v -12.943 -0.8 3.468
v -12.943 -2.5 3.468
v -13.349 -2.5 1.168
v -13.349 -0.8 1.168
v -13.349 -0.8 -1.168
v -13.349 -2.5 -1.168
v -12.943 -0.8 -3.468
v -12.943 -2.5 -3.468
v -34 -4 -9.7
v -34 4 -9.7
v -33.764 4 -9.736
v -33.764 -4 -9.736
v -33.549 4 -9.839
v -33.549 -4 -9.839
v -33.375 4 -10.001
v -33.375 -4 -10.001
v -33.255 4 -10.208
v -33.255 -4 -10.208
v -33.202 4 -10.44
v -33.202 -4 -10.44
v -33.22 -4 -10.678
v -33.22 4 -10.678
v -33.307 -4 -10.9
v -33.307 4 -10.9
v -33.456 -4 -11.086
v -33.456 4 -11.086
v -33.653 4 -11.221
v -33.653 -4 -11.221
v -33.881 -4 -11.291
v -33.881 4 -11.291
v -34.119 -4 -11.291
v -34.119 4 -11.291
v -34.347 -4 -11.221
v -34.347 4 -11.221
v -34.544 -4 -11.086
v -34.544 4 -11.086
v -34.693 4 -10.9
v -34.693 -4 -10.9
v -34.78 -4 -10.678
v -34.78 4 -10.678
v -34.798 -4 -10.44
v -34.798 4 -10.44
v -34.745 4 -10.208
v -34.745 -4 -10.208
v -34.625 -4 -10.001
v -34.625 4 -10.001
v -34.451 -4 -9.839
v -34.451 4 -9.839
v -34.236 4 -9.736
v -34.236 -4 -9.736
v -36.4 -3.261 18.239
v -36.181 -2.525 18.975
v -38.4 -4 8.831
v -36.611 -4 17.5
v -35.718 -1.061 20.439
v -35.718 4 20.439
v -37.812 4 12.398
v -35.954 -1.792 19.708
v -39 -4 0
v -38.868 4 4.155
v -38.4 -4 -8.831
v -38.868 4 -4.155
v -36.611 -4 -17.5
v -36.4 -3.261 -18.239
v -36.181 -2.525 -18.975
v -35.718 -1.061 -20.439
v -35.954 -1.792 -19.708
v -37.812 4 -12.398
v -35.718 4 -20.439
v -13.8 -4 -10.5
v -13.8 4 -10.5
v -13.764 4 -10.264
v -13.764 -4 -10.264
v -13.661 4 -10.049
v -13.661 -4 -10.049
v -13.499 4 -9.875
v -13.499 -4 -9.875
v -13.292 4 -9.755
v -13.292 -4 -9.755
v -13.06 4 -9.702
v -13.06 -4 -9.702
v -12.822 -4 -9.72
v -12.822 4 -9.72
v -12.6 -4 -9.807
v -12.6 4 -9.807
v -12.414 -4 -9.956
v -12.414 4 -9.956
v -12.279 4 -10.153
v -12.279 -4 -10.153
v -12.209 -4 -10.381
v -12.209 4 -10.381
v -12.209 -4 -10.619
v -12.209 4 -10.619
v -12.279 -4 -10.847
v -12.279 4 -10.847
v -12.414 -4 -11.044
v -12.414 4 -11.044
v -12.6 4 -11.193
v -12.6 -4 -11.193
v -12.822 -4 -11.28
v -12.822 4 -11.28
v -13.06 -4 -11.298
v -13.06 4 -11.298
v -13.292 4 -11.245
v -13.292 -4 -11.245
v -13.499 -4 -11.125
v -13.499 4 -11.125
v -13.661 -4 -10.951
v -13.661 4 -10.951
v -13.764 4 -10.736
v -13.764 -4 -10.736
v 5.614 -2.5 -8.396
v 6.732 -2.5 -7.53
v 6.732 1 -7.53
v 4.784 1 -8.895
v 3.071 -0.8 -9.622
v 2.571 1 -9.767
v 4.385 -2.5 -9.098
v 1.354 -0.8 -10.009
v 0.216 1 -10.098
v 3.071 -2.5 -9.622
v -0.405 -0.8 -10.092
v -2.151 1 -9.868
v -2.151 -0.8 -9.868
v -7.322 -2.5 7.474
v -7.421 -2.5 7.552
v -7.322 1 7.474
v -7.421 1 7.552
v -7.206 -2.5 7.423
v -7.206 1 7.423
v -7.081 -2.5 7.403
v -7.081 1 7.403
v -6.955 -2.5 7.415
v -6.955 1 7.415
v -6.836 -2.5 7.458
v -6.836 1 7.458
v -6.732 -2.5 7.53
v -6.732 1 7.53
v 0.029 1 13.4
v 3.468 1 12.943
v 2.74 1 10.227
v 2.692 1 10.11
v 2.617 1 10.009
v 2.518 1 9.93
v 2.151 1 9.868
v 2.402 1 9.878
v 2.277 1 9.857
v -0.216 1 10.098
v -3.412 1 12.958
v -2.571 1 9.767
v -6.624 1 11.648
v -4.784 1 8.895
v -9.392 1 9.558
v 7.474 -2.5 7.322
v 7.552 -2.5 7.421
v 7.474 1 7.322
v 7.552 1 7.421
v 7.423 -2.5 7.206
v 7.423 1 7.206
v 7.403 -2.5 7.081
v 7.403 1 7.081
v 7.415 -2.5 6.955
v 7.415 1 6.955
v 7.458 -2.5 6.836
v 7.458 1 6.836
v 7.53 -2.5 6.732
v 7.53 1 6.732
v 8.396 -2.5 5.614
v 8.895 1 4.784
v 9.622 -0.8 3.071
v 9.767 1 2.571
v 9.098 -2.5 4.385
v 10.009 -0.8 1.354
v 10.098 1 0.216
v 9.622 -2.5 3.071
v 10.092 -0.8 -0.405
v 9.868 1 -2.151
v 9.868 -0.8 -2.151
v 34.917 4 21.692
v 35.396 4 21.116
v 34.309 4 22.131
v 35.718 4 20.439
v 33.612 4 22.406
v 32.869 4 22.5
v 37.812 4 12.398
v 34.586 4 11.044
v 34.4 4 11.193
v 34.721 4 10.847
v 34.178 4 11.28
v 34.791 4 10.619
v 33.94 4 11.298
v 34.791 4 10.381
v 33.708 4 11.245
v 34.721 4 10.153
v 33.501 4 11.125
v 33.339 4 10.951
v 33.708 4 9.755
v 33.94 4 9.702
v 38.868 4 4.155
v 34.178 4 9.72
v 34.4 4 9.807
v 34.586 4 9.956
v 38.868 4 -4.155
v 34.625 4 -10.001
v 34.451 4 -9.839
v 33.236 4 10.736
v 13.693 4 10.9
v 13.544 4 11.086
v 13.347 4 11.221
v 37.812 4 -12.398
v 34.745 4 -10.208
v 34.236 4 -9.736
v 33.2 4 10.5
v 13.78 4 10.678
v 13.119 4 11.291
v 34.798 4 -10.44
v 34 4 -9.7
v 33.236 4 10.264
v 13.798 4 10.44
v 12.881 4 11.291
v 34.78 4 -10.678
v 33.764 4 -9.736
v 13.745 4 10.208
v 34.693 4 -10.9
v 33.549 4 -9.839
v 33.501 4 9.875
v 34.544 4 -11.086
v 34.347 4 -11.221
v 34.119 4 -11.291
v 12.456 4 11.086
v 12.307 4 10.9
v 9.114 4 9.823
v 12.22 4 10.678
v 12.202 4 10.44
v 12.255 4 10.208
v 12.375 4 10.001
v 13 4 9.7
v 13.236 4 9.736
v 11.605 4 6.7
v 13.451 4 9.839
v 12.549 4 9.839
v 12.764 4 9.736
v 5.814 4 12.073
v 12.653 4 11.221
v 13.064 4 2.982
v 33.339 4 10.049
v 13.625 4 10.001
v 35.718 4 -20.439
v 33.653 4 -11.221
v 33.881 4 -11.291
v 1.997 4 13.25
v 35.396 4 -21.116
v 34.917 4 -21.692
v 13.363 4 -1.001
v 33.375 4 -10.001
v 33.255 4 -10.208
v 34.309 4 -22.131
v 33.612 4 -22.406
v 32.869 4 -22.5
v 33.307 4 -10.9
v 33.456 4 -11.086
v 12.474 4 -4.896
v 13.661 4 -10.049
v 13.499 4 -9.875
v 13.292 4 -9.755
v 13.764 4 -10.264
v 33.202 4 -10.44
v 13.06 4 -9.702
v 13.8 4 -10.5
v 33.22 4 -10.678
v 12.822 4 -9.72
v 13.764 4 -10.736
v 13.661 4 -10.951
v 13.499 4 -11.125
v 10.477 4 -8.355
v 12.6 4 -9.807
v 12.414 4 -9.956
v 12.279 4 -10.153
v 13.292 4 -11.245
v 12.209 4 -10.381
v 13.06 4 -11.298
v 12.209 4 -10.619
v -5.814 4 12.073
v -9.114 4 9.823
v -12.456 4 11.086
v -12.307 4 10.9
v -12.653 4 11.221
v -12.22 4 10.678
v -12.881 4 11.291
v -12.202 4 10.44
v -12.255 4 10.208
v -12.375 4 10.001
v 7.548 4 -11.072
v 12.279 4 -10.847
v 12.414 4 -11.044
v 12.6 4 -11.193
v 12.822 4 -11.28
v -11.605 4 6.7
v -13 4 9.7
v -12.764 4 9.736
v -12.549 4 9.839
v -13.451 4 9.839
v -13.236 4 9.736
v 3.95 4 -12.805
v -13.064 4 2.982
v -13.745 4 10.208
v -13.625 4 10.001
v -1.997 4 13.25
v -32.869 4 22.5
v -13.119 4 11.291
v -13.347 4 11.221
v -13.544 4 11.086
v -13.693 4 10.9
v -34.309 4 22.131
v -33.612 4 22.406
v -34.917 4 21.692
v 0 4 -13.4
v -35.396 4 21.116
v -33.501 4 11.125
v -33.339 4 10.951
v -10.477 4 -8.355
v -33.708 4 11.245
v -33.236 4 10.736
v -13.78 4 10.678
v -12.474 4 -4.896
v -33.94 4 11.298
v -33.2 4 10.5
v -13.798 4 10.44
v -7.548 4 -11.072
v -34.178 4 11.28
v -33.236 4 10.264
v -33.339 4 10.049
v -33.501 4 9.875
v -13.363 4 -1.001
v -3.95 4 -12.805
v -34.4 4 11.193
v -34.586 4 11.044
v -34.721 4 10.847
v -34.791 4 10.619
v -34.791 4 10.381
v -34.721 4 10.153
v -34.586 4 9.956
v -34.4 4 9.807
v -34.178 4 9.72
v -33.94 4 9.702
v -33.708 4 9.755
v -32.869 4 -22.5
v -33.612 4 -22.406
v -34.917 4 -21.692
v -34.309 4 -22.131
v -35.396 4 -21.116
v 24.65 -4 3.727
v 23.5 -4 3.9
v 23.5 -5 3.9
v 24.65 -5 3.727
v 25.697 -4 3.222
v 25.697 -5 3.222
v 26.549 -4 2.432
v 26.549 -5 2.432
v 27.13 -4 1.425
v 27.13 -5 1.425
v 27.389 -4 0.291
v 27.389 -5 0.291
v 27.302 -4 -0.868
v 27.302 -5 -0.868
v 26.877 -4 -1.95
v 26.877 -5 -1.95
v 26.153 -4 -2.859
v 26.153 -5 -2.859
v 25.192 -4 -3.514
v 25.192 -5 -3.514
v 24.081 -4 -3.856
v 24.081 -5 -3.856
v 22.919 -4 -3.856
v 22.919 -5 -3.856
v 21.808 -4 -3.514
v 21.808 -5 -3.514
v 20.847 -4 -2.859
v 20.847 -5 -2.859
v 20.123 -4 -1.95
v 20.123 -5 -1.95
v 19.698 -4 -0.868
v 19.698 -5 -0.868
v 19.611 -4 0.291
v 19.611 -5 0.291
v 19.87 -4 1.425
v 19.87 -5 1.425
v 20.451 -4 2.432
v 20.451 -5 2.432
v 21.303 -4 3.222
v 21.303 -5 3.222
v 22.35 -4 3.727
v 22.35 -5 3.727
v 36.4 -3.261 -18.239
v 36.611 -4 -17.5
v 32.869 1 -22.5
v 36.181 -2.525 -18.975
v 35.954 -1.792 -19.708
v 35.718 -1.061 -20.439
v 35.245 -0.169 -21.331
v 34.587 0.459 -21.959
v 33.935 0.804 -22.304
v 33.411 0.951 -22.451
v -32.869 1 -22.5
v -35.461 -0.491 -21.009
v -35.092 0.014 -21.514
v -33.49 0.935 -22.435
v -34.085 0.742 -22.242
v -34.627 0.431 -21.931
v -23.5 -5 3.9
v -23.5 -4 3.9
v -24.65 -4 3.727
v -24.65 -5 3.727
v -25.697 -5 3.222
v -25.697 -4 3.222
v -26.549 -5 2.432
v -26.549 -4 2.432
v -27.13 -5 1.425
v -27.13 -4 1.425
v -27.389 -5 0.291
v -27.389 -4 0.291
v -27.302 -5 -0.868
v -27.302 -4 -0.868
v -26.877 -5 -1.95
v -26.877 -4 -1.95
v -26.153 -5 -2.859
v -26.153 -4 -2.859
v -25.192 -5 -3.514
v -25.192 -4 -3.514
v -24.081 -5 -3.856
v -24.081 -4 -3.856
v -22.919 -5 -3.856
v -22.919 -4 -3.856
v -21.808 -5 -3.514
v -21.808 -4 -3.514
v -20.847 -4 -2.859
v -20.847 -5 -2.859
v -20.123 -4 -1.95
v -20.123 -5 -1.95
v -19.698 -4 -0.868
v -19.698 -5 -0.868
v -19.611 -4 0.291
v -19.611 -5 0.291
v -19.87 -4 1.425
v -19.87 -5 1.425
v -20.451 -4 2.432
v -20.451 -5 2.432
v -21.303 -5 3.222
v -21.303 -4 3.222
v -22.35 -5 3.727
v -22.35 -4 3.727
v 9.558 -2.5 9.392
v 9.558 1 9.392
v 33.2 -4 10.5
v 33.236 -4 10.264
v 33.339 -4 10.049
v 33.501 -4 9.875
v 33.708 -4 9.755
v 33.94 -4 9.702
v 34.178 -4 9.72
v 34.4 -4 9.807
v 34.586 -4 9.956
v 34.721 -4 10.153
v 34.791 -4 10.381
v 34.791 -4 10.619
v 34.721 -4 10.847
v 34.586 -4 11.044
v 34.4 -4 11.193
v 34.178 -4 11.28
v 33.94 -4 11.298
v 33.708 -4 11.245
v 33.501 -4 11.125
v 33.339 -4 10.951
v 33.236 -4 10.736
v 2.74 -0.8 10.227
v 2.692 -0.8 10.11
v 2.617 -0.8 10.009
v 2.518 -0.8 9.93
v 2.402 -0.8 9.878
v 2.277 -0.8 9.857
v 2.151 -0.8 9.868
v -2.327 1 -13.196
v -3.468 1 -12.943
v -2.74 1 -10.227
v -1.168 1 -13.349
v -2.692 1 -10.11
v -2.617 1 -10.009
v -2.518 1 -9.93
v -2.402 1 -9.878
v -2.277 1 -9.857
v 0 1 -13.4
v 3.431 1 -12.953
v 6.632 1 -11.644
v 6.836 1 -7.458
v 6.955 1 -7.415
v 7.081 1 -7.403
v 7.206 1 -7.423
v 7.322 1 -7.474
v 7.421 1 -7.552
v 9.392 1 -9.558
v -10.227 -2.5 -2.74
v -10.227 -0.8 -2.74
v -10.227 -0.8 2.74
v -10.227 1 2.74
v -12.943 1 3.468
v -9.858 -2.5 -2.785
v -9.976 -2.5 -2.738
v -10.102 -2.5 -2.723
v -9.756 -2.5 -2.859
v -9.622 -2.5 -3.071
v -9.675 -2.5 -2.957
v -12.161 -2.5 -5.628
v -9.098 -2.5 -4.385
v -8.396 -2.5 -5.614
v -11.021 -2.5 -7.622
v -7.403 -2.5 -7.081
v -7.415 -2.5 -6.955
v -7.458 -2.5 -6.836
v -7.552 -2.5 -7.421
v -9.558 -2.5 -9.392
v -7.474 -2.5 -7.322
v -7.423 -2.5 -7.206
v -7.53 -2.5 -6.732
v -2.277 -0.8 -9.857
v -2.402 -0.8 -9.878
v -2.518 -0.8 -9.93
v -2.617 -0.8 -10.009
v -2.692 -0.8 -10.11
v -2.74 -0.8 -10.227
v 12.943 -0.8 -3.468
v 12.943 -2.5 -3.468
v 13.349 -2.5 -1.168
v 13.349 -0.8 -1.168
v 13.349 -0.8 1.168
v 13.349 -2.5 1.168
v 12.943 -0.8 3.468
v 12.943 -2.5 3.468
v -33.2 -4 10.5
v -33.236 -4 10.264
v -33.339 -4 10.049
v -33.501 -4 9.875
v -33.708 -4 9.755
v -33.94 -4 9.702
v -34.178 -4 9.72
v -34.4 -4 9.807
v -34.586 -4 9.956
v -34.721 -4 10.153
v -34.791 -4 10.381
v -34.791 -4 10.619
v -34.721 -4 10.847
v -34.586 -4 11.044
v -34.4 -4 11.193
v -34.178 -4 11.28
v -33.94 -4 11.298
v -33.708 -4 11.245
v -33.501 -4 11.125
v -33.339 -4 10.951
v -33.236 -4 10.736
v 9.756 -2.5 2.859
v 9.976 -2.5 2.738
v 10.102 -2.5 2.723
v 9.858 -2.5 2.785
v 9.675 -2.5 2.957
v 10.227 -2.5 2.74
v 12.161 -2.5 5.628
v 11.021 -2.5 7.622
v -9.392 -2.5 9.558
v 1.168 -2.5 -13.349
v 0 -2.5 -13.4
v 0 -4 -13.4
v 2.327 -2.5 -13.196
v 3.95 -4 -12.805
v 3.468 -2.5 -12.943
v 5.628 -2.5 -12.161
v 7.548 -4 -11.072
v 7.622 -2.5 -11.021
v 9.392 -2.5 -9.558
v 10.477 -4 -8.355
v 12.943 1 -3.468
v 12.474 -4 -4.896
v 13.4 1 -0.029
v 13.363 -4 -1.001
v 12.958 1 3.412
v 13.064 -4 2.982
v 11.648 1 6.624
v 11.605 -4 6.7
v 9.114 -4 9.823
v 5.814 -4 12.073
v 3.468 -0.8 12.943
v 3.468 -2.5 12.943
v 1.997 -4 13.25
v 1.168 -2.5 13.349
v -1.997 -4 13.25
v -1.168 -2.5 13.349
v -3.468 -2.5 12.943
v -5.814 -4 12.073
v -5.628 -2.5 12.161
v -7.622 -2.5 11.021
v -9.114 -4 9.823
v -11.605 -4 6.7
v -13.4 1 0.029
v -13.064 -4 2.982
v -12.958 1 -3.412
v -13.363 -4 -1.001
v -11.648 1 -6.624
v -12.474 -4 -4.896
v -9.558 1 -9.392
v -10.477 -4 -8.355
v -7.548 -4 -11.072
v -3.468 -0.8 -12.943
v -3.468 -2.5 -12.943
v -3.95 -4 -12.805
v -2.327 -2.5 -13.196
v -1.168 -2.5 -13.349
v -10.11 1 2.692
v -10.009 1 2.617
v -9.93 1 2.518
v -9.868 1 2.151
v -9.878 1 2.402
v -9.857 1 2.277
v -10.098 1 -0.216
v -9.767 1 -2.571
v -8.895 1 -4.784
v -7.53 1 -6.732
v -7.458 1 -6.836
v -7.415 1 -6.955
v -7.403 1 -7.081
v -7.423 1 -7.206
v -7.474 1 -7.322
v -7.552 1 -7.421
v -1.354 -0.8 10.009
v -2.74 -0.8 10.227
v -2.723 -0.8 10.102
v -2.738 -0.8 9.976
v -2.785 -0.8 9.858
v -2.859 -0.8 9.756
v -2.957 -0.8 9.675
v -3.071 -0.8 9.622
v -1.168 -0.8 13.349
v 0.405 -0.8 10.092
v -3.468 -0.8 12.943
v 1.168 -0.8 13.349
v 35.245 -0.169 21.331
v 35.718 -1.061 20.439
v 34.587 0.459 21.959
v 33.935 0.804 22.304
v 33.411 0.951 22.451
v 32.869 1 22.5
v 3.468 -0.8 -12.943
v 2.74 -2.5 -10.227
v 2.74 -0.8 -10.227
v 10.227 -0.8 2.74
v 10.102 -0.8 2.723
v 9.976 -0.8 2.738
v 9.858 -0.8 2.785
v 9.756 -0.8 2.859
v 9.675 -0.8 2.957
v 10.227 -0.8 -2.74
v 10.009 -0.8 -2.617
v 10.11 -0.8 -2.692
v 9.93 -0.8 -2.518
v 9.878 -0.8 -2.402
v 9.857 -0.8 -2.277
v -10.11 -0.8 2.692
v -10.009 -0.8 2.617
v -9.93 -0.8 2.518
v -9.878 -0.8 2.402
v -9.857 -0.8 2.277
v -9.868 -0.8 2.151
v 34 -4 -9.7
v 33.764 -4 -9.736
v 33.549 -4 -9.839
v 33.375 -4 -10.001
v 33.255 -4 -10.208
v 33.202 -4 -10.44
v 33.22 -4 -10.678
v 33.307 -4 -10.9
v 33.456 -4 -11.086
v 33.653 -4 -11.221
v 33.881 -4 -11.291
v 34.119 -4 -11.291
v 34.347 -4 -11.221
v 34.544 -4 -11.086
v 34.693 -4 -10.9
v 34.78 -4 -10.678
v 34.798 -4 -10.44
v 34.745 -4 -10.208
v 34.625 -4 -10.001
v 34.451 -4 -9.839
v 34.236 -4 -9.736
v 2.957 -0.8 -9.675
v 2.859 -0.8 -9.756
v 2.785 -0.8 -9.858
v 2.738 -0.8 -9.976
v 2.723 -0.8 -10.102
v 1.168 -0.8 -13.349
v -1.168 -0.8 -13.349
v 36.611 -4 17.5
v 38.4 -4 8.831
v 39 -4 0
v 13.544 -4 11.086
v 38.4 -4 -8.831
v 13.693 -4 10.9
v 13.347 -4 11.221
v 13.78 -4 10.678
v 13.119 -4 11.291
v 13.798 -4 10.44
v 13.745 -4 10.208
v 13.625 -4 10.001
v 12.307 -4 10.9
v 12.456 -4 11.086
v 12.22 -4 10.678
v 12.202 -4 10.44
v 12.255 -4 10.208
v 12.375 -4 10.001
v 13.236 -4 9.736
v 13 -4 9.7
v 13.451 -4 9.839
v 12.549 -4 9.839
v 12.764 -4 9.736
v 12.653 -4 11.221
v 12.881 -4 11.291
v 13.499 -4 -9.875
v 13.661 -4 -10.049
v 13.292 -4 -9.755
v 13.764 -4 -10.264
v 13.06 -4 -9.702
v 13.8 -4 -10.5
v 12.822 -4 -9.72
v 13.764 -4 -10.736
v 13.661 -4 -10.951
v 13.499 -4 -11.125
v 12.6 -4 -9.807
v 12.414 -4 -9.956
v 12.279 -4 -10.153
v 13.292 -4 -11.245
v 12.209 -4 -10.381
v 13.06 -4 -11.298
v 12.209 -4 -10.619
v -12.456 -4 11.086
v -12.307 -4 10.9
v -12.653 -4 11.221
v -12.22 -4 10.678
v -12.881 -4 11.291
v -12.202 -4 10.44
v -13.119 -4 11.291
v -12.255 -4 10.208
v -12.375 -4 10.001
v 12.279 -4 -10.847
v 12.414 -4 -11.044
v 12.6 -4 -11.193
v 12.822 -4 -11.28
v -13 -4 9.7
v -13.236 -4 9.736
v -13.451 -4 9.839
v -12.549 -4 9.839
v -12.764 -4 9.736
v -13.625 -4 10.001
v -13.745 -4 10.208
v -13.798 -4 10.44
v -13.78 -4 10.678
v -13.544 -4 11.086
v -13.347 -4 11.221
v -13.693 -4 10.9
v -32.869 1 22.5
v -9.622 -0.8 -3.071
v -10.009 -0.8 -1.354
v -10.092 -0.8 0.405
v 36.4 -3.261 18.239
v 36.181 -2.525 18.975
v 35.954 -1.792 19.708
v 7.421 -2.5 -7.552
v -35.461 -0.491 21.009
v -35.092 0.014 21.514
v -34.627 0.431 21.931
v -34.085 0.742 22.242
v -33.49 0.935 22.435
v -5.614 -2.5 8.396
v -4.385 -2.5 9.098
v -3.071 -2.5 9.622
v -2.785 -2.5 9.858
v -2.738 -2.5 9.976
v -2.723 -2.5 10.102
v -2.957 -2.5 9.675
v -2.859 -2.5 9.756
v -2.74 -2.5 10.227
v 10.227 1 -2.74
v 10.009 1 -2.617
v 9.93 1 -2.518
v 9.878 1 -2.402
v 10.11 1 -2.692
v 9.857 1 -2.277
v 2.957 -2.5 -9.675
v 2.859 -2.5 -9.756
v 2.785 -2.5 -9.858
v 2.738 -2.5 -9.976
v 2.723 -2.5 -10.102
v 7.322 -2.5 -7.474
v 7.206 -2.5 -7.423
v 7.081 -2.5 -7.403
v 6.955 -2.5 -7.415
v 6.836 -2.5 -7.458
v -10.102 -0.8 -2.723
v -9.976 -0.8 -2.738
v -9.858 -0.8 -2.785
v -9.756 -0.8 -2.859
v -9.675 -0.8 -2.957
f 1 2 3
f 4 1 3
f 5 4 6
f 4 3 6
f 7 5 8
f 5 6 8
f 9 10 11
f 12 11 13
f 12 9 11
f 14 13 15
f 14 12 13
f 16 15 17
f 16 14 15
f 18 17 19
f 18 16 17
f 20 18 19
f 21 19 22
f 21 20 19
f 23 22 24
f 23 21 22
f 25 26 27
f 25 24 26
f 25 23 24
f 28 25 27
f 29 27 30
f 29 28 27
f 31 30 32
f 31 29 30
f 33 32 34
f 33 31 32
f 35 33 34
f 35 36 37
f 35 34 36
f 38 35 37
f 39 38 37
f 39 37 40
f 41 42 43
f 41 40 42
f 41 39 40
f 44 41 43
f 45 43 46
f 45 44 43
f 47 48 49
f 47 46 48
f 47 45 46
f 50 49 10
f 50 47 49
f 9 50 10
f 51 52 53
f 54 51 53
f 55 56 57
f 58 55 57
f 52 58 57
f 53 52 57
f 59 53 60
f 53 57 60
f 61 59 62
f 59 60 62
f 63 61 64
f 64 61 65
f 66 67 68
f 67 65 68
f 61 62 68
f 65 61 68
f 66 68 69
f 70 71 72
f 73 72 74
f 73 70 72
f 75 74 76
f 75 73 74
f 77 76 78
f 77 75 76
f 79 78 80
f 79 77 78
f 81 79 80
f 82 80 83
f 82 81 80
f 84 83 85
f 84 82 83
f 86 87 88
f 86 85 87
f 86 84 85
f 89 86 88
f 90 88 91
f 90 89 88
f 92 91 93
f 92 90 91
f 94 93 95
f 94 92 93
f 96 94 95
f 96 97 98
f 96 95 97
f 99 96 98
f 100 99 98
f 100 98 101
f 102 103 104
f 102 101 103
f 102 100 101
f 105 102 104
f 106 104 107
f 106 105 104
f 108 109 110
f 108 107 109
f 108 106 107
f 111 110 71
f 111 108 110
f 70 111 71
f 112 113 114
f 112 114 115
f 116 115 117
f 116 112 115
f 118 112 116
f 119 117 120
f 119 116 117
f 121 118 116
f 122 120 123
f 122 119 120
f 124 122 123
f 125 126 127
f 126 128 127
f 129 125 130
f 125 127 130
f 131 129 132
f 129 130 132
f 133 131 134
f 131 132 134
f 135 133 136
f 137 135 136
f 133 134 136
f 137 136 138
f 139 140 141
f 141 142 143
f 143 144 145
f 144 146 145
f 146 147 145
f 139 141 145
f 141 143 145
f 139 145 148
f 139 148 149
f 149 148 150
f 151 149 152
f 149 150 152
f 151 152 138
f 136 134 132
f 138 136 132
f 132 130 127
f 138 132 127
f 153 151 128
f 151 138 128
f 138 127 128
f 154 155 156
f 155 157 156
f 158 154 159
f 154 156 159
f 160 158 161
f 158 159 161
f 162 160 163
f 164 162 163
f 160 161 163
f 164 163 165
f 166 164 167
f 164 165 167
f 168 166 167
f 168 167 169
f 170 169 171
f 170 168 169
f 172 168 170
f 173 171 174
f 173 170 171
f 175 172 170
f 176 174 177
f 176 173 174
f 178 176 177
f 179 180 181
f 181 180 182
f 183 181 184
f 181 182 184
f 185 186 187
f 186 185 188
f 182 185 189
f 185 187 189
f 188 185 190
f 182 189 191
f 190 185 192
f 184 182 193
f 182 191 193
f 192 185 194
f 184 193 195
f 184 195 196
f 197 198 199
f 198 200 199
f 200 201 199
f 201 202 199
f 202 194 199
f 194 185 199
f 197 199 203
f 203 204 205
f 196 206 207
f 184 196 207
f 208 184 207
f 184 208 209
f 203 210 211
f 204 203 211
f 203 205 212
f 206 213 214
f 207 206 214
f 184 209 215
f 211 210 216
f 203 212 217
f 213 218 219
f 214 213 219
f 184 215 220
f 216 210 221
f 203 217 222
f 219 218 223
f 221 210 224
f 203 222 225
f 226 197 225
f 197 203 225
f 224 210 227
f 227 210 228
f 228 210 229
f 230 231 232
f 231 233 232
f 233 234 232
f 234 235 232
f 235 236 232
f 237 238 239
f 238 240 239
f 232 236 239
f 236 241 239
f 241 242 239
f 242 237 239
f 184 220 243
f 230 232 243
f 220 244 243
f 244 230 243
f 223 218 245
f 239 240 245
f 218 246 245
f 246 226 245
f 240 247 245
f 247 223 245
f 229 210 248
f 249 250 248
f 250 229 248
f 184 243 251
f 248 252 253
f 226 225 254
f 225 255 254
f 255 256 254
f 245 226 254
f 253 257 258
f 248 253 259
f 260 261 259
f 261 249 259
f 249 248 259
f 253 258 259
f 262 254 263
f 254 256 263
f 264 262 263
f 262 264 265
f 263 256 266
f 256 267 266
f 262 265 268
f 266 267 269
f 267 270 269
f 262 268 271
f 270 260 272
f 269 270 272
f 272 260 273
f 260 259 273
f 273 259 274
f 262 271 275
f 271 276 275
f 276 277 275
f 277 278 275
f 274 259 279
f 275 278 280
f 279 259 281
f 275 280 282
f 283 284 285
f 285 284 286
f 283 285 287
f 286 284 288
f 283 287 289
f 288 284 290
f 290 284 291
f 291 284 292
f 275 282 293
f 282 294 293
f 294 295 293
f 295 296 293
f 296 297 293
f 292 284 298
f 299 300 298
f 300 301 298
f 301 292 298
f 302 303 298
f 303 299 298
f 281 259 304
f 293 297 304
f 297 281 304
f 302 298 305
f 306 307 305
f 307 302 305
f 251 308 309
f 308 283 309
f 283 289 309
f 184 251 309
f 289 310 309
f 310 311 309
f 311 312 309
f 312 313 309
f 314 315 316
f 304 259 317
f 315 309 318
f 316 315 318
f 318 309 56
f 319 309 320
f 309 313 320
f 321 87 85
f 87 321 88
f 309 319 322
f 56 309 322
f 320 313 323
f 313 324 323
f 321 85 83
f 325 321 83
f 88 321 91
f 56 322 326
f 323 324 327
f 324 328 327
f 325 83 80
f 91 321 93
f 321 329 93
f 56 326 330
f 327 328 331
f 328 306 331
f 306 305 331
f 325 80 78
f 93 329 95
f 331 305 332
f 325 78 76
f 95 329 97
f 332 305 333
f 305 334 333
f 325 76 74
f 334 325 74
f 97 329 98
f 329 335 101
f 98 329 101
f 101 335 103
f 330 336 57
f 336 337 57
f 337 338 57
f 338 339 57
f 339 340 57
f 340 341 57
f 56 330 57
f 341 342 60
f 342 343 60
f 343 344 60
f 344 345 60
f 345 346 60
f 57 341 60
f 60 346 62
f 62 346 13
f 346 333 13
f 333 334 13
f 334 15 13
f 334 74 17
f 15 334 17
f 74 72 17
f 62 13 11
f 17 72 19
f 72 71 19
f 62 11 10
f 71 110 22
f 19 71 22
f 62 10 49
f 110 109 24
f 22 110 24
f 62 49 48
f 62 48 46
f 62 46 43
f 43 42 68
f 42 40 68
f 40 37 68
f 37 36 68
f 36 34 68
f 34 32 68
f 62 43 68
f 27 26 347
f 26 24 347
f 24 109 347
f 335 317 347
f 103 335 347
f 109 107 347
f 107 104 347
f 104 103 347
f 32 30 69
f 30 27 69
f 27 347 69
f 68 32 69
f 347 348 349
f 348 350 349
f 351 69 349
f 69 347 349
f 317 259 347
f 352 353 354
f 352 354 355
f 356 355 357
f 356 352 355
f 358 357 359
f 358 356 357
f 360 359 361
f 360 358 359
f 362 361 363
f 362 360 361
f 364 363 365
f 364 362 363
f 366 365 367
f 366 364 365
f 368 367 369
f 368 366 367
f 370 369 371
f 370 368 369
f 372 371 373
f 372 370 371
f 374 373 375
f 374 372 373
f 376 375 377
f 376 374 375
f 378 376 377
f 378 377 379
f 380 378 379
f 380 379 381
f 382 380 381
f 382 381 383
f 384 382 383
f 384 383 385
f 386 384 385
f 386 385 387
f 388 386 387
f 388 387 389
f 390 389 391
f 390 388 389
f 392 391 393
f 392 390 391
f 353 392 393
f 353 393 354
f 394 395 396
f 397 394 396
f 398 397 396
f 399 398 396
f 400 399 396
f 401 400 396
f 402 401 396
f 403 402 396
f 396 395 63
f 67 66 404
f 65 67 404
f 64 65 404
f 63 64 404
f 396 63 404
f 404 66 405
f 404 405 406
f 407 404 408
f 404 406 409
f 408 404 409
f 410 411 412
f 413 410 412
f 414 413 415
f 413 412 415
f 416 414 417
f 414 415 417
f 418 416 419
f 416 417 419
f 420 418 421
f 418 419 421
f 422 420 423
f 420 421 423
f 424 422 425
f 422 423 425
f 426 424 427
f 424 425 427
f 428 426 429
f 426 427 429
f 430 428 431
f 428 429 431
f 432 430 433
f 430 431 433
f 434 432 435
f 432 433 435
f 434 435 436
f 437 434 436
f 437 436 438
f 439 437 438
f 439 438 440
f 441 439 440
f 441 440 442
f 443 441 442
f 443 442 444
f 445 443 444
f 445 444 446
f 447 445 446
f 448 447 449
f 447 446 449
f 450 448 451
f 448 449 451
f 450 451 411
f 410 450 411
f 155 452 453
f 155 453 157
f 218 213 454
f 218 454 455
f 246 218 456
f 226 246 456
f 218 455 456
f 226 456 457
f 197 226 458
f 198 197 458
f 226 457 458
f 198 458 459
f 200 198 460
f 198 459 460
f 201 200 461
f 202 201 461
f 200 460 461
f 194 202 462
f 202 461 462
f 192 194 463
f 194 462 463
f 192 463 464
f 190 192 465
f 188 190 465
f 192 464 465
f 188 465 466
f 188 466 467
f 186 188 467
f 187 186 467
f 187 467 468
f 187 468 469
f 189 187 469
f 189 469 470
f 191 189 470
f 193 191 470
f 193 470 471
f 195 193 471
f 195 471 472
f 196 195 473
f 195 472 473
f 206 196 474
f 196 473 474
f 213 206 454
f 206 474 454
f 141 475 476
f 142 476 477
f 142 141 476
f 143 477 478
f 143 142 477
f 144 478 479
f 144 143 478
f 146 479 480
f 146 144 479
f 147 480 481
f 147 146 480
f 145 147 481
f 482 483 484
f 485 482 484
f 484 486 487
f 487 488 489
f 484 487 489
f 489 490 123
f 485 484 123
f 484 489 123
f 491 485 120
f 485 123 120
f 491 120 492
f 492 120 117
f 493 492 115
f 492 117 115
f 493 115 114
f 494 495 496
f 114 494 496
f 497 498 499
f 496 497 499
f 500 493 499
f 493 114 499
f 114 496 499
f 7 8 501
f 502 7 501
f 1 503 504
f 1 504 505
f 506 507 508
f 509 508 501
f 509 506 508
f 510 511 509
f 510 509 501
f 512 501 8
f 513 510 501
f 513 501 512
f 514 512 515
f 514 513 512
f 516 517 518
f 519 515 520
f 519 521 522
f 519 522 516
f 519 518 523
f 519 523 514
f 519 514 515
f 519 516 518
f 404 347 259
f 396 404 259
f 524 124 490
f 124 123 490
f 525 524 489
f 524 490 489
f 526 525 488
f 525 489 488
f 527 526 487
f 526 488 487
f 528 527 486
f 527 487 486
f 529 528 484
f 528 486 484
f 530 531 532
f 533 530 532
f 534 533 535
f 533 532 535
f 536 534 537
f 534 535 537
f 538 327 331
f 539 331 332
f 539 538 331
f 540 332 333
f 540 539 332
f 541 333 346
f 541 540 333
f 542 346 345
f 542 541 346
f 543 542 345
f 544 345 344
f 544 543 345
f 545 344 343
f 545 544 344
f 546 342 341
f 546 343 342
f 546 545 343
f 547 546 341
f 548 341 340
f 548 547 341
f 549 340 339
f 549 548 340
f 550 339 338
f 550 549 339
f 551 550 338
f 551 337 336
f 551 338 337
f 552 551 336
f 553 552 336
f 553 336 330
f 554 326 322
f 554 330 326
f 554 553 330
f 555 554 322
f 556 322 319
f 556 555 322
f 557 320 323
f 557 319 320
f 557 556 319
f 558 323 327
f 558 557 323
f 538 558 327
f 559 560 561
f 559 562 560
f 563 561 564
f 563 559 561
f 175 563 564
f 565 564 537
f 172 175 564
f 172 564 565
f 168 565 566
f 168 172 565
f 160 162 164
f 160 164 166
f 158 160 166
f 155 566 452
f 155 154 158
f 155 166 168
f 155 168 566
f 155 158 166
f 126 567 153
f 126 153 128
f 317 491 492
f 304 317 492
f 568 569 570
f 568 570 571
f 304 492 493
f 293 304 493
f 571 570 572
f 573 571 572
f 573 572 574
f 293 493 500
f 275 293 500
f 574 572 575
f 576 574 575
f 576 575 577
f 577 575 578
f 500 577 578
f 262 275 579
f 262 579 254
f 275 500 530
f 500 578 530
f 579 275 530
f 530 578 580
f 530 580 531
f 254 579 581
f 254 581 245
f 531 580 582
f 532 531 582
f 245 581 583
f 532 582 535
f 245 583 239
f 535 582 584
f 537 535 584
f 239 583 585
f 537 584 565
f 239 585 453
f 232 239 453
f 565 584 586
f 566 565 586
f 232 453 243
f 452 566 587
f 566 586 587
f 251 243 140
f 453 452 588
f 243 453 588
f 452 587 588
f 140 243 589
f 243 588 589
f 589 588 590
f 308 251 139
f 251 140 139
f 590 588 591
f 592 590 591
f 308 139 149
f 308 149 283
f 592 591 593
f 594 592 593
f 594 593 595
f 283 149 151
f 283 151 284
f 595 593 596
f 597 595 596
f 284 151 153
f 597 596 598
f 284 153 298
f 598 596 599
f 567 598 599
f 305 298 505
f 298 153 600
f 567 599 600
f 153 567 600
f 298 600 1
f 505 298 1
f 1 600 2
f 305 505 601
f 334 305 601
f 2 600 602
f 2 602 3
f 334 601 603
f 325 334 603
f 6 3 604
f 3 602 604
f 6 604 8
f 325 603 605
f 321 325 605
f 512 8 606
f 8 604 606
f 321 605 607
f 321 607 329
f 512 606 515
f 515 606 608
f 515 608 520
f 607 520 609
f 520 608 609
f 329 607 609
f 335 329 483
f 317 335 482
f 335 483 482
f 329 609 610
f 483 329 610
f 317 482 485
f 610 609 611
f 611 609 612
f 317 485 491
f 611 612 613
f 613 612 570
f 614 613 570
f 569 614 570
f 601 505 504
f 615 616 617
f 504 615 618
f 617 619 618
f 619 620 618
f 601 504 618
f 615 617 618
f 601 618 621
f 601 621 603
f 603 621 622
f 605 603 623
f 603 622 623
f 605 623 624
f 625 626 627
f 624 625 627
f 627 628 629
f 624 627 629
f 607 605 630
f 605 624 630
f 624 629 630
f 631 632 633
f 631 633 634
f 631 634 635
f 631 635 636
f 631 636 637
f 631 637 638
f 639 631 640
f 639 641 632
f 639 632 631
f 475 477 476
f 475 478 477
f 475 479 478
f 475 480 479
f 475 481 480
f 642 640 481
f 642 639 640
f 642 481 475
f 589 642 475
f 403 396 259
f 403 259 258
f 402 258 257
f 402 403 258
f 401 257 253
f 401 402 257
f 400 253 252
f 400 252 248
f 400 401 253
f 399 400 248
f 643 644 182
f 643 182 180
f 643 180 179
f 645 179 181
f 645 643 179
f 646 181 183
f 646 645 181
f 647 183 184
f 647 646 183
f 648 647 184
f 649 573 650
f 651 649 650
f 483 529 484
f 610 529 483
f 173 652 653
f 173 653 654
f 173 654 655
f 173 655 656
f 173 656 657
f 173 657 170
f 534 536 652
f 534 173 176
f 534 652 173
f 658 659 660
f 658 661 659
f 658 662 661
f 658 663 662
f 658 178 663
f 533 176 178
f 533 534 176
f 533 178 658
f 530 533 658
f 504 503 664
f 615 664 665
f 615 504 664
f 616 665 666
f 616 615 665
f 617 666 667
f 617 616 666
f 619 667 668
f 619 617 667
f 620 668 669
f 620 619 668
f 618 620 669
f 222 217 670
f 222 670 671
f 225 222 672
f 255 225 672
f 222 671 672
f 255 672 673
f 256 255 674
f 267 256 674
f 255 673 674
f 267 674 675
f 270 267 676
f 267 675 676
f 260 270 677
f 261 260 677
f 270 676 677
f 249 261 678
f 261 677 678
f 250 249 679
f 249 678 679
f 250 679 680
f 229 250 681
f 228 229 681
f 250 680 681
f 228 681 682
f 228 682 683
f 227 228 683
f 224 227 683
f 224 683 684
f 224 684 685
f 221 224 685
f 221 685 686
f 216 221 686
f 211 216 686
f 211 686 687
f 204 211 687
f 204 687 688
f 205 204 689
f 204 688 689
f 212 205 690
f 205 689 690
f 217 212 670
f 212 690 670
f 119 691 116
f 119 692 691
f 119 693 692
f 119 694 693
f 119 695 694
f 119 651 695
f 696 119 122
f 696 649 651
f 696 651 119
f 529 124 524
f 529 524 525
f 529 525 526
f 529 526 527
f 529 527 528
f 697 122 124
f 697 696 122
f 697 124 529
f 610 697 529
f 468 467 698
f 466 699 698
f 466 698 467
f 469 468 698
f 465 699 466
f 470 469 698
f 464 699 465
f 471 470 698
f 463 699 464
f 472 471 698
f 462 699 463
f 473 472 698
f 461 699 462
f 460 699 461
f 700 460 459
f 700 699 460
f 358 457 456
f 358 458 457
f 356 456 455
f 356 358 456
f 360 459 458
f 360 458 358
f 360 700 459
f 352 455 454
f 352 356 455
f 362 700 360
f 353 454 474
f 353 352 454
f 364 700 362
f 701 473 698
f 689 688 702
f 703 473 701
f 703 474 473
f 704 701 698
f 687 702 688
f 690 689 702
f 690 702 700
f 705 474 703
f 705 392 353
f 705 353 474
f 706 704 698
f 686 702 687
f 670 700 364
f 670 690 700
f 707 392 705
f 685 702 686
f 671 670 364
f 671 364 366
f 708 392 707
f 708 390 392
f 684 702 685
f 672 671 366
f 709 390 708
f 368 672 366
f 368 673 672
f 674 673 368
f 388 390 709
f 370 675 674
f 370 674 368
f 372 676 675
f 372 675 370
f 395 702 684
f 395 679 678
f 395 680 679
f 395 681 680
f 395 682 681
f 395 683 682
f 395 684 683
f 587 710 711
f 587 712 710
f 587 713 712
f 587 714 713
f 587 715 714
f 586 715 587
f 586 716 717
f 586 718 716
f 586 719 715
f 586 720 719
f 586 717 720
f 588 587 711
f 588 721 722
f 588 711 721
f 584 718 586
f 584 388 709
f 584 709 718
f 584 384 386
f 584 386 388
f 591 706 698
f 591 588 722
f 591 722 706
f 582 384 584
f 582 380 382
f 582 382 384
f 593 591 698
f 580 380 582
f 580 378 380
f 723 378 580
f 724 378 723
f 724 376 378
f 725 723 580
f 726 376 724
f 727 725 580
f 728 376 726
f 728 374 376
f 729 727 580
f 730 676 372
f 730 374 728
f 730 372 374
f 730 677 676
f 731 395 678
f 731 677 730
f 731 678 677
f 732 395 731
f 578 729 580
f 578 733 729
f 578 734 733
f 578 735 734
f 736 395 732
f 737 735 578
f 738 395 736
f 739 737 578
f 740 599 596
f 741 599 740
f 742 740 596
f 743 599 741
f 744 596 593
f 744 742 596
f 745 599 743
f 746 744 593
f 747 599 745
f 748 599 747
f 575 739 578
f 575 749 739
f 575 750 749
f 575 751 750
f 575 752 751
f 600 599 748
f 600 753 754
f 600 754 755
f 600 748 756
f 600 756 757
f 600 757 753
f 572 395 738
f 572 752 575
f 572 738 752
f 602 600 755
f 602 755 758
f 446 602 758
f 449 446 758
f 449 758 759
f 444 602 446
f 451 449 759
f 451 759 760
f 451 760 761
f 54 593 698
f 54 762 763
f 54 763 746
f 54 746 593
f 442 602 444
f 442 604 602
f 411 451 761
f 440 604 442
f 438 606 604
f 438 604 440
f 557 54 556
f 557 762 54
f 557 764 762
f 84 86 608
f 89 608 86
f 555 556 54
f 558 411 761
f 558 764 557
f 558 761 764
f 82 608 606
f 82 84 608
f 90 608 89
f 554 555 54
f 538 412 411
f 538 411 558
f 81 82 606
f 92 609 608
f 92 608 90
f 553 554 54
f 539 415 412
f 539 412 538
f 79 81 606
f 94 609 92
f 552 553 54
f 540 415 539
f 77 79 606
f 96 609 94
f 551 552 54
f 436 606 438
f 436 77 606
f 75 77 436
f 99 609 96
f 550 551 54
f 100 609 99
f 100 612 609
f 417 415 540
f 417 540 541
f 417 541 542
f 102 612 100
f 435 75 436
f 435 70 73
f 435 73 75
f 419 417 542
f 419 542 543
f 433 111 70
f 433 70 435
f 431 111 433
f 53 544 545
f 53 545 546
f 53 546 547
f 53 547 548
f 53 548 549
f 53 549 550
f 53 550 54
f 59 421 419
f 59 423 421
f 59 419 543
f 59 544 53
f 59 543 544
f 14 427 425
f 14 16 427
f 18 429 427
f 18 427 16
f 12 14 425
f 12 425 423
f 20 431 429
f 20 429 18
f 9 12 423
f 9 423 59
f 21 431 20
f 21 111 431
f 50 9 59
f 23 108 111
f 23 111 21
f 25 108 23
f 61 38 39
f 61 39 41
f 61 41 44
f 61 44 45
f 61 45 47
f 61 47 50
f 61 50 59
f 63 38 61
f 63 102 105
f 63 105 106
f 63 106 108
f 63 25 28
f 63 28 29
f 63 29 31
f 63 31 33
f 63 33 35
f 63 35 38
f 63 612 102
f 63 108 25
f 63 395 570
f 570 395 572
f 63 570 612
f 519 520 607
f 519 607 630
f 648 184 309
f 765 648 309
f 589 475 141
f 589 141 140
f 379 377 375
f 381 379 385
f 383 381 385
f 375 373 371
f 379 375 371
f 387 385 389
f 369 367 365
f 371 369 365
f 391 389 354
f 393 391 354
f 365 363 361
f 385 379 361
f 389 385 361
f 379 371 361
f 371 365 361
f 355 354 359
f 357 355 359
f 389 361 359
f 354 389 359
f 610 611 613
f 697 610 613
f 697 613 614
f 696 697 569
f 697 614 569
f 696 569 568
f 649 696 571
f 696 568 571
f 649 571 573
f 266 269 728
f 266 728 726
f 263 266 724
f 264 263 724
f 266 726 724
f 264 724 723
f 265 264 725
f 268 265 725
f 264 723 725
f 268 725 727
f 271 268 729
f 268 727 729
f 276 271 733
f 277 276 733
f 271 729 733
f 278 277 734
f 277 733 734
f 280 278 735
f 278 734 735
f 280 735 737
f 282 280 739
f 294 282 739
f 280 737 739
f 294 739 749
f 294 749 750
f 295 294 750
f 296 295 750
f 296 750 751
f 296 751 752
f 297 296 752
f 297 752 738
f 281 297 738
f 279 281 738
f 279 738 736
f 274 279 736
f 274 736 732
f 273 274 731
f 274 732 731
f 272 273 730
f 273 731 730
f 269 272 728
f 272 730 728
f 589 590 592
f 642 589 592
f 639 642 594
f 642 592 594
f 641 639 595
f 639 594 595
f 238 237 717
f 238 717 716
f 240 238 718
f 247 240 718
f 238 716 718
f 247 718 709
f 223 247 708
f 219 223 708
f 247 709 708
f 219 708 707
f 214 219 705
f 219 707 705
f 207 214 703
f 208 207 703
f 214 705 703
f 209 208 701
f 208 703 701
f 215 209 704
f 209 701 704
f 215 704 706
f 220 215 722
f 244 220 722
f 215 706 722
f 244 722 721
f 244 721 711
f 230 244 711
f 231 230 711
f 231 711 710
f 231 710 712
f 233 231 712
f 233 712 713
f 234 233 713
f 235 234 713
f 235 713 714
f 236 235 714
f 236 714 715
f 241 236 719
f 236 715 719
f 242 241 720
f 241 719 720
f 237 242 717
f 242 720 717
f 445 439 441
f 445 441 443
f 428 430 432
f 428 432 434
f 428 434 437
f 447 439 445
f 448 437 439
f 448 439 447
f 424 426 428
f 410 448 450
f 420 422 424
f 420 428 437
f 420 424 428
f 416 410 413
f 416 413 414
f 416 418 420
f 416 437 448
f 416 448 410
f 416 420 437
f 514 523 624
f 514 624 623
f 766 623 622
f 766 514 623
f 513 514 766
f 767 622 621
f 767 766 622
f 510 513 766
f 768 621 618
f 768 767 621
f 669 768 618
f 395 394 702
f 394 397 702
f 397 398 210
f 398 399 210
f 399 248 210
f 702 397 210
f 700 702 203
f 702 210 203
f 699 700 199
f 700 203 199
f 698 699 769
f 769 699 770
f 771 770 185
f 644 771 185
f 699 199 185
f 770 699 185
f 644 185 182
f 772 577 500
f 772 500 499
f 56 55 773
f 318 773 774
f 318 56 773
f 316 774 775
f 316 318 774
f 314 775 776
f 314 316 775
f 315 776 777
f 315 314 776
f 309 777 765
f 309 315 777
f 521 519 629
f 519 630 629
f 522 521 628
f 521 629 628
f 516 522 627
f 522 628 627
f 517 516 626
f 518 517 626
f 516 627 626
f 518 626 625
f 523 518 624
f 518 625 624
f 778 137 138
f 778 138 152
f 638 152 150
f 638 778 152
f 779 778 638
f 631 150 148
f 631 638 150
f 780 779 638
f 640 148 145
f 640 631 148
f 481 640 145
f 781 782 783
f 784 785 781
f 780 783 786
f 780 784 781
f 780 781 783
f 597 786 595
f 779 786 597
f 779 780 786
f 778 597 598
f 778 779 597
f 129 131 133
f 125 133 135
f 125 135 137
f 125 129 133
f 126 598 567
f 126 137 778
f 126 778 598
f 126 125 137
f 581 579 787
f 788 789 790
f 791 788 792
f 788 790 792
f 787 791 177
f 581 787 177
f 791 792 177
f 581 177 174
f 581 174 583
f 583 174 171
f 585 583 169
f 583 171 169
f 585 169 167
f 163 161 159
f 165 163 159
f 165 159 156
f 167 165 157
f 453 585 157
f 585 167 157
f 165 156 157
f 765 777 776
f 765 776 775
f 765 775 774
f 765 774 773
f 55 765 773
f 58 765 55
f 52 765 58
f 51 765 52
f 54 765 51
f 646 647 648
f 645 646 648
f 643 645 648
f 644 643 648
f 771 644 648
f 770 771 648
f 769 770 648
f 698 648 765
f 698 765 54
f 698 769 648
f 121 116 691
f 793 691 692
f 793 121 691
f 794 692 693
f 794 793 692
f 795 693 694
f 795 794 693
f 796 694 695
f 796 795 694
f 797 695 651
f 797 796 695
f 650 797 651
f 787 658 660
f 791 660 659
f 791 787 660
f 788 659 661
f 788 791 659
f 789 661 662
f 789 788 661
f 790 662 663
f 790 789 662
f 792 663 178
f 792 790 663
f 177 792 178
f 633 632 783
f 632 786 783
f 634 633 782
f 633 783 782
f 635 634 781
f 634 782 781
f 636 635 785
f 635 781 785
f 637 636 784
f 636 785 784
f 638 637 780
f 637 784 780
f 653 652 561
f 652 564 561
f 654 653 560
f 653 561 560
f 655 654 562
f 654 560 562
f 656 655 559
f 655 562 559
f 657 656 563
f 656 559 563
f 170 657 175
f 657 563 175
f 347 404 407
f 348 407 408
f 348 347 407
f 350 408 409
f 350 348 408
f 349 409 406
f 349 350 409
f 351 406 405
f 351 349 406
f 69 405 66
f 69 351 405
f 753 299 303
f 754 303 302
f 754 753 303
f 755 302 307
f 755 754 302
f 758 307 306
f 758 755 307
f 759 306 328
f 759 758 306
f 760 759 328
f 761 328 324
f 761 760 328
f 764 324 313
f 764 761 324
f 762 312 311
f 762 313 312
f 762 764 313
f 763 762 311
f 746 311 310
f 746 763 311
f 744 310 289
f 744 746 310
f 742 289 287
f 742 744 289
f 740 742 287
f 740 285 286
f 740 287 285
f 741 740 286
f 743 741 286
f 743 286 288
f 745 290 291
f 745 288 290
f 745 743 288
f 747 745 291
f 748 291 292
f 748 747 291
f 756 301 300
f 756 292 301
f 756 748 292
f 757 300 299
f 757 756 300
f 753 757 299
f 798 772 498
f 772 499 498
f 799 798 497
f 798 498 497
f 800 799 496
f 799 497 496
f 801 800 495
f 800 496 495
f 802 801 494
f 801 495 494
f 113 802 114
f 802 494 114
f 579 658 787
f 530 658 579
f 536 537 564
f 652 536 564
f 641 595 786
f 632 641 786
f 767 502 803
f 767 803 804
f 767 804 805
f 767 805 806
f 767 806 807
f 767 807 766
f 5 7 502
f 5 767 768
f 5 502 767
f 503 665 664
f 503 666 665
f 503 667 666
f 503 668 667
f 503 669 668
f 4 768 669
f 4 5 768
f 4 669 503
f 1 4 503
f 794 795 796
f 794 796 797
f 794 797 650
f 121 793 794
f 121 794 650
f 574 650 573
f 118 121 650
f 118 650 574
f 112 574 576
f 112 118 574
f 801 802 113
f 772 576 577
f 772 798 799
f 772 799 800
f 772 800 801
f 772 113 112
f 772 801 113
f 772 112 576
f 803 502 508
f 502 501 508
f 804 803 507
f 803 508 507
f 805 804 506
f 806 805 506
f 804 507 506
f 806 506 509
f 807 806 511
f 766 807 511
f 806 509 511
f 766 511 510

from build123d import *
from build123d.topology import SkipClean

# Parameters (mm, degrees)
EXTRUDE_1_DEPTH                  = 4
SKETCH_9_R                       = 13.4
CUT_EXTRUDE_1_DEPTH              = 46.730186967
FILLET_4_R                       = 3
CHAMFER_3_SIZE                   = 5
SKETCH_10_R                      = 3.9
EXTRUDE_8_DEPTH                  = 1
PATTERN_CIRCULAR_4_COUNT         = 4
EXTRUDE_START                    = -3.5
EXTRUDE_9_DEPTH                  = 3.5
CUT_EXTRUDE_2_DEPTH              = 1.7
FILLET_5_R                       = 0.5
PATTERN_CIRCULAR_5_COUNT         = 4
FILLET_5_OF_PATTERN_CIRCULAR_5_R = 0.5


with BuildPart() as part:
    # ｽｹｯﾁ2 → ﾎﾞｽ - 押し出し1 (new, symmetric)
    with BuildSketch(Plane(origin=(0, 0, 0), x_dir=(1, 0, 0), z_dir=(0, 1, 0))):
        with BuildLine():
            Line((-35, 22.5), (35, 22.5))
            ThreePointArc((35, 22.5), (39, 0), (35, -22.5))
            Line((35, -22.5), (-35, -22.5))
            ThreePointArc((-35, -22.5), (-39, 0), (-35, 22.5))
        make_face()
    extrude(amount=EXTRUDE_1_DEPTH, both=True)

    # ｽｹｯﾁ9 → ｶｯﾄ - 押し出し1 (cut, through all)
    with BuildSketch(Plane.XZ.offset(4)):
        with Locations(Location((0, 0, 0), (0, 0, 270))):
            Circle(SKETCH_9_R)
    extrude(amount=-CUT_EXTRUDE_1_DEPTH, mode=Mode.SUBTRACT)

    # ﾌｨﾚｯﾄ4
    fillet_4_edges = [part.edges().sort_by_distance(p)[0] for p in [
        (-35, 0, -22.5),
        (35, 0, -22.5),
        (35, 0, 22.5),
        (-35, 0, 22.5),
    ]]
    fillet(fillet_4_edges, radius=FILLET_4_R)

    # 面取り3
    # the kernel refuses this chamfer: 5 mm, written as the material it takes off along each edge
    with BuildSketch(Plane(origin=(-45.727009416, -4, -22.5), x_dir=(0, -0.027495876610586317, 0.9996219169112968), z_dir=(1, 0, 0))) as chamfer_3_piece_1:
        Polygon((CHAMFER_3_SIZE * 0.999621916911, -CHAMFER_3_SIZE * 0.0274958766106), (-CHAMFER_3_SIZE * 0.0274958766106, -CHAMFER_3_SIZE * 0.999621916911), (0, 0), align=None)
    extrude(amount=91.454018832, mode=Mode.SUBTRACT)
    with BuildSketch(Plane(origin=(45.727009416, -4, 22.5), x_dir=(0, 0.9996219169112968, 0.027495876610586317), z_dir=(-1, 0, 0))) as chamfer_3_piece_2:
        Polygon((CHAMFER_3_SIZE * 0.999621916911, CHAMFER_3_SIZE * 0.0274958766106), (-CHAMFER_3_SIZE * 0.0274958766106, CHAMFER_3_SIZE * 0.999621916911), (0, 0), align=None)
    extrude(amount=91.454018832, mode=Mode.SUBTRACT)

    # ｽｹｯﾁ10 → ﾎﾞｽ - 押し出し8 (add)
    with BuildSketch(Plane.XZ.offset(4)):
        with Locations(Location((-23.5, 0, 0), (0, 0, 90))):
            Circle(SKETCH_10_R)
    extrude_8 = extrude(amount=EXTRUDE_8_DEPTH)

    # ｽｹｯﾁ12 → M2 ねじ穴1 (revolve, cut)
    with BuildSketch(Plane(origin=(-13, -4, 10.5), x_dir=(0, 0, -1), z_dir=(1, 0, 0))):
        Polygon((0, 0), (0, 10.480688495), (0.8, 10), (0.8, 0), align=None)
    hole_wizard_m2_1 = revolve(axis=Axis((-13, -10.35, 10.5), (0, 1, 0)), mode=Mode.SUBTRACT)

    # 円形ﾊﾟﾀｰﾝ4: M2 ねじ穴1 ×4 about axis
    pattern_circular_4_axis = Axis((-23.5, 0, 0), (0, 1, 0))
    for i in range(1, PATTERN_CIRCULAR_4_COUNT):
        add(hole_wizard_m2_1.rotate(pattern_circular_4_axis, i * 360 / PATTERN_CIRCULAR_4_COUNT), mode=Mode.SUBTRACT)

    # ﾐﾗｰ3: ﾎﾞｽ - 押し出し8, M2 ねじ穴1 across plane
    add(extrude_8.mirror(Plane(origin=(0, 0, 0), x_dir=(0, 0, 1), z_dir=(1, 0, 0))))
    add(hole_wizard_m2_1.mirror(Plane(origin=(0, 0, 0), x_dir=(0, 0, 1), z_dir=(1, 0, 0))), mode=Mode.SUBTRACT)

    # ﾐﾗｰ3 copy 1 sketch → ﾐﾗｰ3 copy 1 (revolve, cut)
    with BuildSketch(Plane(origin=(13, -4, -10.5), x_dir=(1, 0, 0), z_dir=(0, 0, -1))):
        Polygon((0, 0), (0, -10.480688495), (0.8, -10), (0.8, 0), align=None)
    revolve(axis=Axis((13, -10.35, -10.5), (0, -1, 0)), mode=Mode.SUBTRACT)

    # ﾐﾗｰ3 copy 2 sketch → ﾐﾗｰ3 copy 2 (revolve, cut)
    with BuildSketch(Plane(origin=(34, -4, -10.5), x_dir=(0, 0, 1), z_dir=(1, 0, 0))):
        Polygon((0, 0), (0, -10.480688495), (0.8, -10), (0.8, 0), align=None)
    revolve(axis=Axis((34, -10.35, -10.5), (0, -1, 0)), mode=Mode.SUBTRACT)

    # ﾐﾗｰ3 copy 3 sketch → ﾐﾗｰ3 copy 3 (revolve, cut)
    with BuildSketch(Plane(origin=(34, -4, 10.5), x_dir=(-1, 0, 0), z_dir=(0, 0, 1))):
        Polygon((0, 0), (0, -10.480688495), (0.8, -10), (0.8, 0), align=None)
    revolve(axis=Axis((34, -10.35, 10.5), (0, -1, 0)), mode=Mode.SUBTRACT)

    # ｽｹｯﾁ13 → ﾎﾞｽ - 押し出し9 (add)
    with BuildSketch(Plane(origin=(0, 1, 0), x_dir=(1, 0, 0), z_dir=(0, 1, 0)).offset(EXTRUDE_START)):
        with BuildLine():
            Line((-9.392184142, -9.557556019), (-7.079183569, -7.203829536))
            ThreePointArc((-7.079183569, -7.203829536), (-2.571479677, -9.767163983), (2.614072356, -9.755850846))
            Line((2.614072356, -9.755850846), (3.468175204, -12.943406072))
            ThreePointArc((3.468175204, -12.943406072), (-3.411666106, -12.958415581), (-9.392184142, -9.557556019))
        make_face()
    extrude_9 = extrude(amount=EXTRUDE_9_DEPTH)

    # ｽｹｯﾁ14 → ｶｯﾄ - 押し出し2 (cut)
    with BuildSketch(Plane.XZ.offset(2.5)):
        with BuildLine():
            Line((0, 0), (3.468175204, 12.943406072))
            ThreePointArc((3.468175204, 12.943406072), (0, 13.4), (-3.468175204, 12.943406072))
            Line((-3.468175204, 12.943406072), (0, 0))
        make_face()
    cut_extrude_2 = extrude(amount=-CUT_EXTRUDE_2_DEPTH, mode=Mode.SUBTRACT)

    # ﾌｨﾚｯﾄ5
    fillet_5_edges = [part.edges().sort_by_distance(p)[0] for p in [
        (-7.079183569, -0.75, 7.203829536),
        (2.614072356, 0.1, 9.755850846),
        (-2.614072356, -1.65, 9.755850846),
    ]]
    fillet(fillet_5_edges, radius=FILLET_5_R)

    # 円形ﾊﾟﾀｰﾝ5: ﾎﾞｽ - 押し出し9, ｶｯﾄ - 押し出し2 ×4 about axis
    with SkipClean():  # the faces are left unmerged after this step: merging them gives an invalid solid
        pattern_circular_5_axis = Axis((0, 0, 0), (0, 1, 0))
        add([extrude_9.rotate(pattern_circular_5_axis, i * 360 / PATTERN_CIRCULAR_5_COUNT) for i in range(1, PATTERN_CIRCULAR_5_COUNT)])
        add([cut_extrude_2.rotate(pattern_circular_5_axis, i * 360 / PATTERN_CIRCULAR_5_COUNT) for i in range(1, PATTERN_CIRCULAR_5_COUNT)], mode=Mode.SUBTRACT)

    # ﾌｨﾚｯﾄ5 of 円形ﾊﾟﾀｰﾝ5
    fillet_5_of_pattern_circular_5_edges = [part.edges().sort_by_distance(p)[0] for p in [
        (7.203829536, -0.75, 7.079183569),
        (9.755850846, 0.1, -2.614072356),
        (9.755850846, -1.65, 2.614072356),
        (7.079183569, -0.75, -7.203829536),
        (-2.614072356, 0.1, -9.755850846),
        (2.614072356, -1.65, -9.755850846),
        (-7.203829536, -0.75, -7.079183569),
        (-9.755850846, 0.1, 2.614072356),
        (-9.755850846, -1.65, -2.614072356),
    ]]
    fillet(fillet_5_of_pattern_circular_5_edges, radius=FILLET_5_OF_PATTERN_CIRCULAR_5_R)


solid = part.part
